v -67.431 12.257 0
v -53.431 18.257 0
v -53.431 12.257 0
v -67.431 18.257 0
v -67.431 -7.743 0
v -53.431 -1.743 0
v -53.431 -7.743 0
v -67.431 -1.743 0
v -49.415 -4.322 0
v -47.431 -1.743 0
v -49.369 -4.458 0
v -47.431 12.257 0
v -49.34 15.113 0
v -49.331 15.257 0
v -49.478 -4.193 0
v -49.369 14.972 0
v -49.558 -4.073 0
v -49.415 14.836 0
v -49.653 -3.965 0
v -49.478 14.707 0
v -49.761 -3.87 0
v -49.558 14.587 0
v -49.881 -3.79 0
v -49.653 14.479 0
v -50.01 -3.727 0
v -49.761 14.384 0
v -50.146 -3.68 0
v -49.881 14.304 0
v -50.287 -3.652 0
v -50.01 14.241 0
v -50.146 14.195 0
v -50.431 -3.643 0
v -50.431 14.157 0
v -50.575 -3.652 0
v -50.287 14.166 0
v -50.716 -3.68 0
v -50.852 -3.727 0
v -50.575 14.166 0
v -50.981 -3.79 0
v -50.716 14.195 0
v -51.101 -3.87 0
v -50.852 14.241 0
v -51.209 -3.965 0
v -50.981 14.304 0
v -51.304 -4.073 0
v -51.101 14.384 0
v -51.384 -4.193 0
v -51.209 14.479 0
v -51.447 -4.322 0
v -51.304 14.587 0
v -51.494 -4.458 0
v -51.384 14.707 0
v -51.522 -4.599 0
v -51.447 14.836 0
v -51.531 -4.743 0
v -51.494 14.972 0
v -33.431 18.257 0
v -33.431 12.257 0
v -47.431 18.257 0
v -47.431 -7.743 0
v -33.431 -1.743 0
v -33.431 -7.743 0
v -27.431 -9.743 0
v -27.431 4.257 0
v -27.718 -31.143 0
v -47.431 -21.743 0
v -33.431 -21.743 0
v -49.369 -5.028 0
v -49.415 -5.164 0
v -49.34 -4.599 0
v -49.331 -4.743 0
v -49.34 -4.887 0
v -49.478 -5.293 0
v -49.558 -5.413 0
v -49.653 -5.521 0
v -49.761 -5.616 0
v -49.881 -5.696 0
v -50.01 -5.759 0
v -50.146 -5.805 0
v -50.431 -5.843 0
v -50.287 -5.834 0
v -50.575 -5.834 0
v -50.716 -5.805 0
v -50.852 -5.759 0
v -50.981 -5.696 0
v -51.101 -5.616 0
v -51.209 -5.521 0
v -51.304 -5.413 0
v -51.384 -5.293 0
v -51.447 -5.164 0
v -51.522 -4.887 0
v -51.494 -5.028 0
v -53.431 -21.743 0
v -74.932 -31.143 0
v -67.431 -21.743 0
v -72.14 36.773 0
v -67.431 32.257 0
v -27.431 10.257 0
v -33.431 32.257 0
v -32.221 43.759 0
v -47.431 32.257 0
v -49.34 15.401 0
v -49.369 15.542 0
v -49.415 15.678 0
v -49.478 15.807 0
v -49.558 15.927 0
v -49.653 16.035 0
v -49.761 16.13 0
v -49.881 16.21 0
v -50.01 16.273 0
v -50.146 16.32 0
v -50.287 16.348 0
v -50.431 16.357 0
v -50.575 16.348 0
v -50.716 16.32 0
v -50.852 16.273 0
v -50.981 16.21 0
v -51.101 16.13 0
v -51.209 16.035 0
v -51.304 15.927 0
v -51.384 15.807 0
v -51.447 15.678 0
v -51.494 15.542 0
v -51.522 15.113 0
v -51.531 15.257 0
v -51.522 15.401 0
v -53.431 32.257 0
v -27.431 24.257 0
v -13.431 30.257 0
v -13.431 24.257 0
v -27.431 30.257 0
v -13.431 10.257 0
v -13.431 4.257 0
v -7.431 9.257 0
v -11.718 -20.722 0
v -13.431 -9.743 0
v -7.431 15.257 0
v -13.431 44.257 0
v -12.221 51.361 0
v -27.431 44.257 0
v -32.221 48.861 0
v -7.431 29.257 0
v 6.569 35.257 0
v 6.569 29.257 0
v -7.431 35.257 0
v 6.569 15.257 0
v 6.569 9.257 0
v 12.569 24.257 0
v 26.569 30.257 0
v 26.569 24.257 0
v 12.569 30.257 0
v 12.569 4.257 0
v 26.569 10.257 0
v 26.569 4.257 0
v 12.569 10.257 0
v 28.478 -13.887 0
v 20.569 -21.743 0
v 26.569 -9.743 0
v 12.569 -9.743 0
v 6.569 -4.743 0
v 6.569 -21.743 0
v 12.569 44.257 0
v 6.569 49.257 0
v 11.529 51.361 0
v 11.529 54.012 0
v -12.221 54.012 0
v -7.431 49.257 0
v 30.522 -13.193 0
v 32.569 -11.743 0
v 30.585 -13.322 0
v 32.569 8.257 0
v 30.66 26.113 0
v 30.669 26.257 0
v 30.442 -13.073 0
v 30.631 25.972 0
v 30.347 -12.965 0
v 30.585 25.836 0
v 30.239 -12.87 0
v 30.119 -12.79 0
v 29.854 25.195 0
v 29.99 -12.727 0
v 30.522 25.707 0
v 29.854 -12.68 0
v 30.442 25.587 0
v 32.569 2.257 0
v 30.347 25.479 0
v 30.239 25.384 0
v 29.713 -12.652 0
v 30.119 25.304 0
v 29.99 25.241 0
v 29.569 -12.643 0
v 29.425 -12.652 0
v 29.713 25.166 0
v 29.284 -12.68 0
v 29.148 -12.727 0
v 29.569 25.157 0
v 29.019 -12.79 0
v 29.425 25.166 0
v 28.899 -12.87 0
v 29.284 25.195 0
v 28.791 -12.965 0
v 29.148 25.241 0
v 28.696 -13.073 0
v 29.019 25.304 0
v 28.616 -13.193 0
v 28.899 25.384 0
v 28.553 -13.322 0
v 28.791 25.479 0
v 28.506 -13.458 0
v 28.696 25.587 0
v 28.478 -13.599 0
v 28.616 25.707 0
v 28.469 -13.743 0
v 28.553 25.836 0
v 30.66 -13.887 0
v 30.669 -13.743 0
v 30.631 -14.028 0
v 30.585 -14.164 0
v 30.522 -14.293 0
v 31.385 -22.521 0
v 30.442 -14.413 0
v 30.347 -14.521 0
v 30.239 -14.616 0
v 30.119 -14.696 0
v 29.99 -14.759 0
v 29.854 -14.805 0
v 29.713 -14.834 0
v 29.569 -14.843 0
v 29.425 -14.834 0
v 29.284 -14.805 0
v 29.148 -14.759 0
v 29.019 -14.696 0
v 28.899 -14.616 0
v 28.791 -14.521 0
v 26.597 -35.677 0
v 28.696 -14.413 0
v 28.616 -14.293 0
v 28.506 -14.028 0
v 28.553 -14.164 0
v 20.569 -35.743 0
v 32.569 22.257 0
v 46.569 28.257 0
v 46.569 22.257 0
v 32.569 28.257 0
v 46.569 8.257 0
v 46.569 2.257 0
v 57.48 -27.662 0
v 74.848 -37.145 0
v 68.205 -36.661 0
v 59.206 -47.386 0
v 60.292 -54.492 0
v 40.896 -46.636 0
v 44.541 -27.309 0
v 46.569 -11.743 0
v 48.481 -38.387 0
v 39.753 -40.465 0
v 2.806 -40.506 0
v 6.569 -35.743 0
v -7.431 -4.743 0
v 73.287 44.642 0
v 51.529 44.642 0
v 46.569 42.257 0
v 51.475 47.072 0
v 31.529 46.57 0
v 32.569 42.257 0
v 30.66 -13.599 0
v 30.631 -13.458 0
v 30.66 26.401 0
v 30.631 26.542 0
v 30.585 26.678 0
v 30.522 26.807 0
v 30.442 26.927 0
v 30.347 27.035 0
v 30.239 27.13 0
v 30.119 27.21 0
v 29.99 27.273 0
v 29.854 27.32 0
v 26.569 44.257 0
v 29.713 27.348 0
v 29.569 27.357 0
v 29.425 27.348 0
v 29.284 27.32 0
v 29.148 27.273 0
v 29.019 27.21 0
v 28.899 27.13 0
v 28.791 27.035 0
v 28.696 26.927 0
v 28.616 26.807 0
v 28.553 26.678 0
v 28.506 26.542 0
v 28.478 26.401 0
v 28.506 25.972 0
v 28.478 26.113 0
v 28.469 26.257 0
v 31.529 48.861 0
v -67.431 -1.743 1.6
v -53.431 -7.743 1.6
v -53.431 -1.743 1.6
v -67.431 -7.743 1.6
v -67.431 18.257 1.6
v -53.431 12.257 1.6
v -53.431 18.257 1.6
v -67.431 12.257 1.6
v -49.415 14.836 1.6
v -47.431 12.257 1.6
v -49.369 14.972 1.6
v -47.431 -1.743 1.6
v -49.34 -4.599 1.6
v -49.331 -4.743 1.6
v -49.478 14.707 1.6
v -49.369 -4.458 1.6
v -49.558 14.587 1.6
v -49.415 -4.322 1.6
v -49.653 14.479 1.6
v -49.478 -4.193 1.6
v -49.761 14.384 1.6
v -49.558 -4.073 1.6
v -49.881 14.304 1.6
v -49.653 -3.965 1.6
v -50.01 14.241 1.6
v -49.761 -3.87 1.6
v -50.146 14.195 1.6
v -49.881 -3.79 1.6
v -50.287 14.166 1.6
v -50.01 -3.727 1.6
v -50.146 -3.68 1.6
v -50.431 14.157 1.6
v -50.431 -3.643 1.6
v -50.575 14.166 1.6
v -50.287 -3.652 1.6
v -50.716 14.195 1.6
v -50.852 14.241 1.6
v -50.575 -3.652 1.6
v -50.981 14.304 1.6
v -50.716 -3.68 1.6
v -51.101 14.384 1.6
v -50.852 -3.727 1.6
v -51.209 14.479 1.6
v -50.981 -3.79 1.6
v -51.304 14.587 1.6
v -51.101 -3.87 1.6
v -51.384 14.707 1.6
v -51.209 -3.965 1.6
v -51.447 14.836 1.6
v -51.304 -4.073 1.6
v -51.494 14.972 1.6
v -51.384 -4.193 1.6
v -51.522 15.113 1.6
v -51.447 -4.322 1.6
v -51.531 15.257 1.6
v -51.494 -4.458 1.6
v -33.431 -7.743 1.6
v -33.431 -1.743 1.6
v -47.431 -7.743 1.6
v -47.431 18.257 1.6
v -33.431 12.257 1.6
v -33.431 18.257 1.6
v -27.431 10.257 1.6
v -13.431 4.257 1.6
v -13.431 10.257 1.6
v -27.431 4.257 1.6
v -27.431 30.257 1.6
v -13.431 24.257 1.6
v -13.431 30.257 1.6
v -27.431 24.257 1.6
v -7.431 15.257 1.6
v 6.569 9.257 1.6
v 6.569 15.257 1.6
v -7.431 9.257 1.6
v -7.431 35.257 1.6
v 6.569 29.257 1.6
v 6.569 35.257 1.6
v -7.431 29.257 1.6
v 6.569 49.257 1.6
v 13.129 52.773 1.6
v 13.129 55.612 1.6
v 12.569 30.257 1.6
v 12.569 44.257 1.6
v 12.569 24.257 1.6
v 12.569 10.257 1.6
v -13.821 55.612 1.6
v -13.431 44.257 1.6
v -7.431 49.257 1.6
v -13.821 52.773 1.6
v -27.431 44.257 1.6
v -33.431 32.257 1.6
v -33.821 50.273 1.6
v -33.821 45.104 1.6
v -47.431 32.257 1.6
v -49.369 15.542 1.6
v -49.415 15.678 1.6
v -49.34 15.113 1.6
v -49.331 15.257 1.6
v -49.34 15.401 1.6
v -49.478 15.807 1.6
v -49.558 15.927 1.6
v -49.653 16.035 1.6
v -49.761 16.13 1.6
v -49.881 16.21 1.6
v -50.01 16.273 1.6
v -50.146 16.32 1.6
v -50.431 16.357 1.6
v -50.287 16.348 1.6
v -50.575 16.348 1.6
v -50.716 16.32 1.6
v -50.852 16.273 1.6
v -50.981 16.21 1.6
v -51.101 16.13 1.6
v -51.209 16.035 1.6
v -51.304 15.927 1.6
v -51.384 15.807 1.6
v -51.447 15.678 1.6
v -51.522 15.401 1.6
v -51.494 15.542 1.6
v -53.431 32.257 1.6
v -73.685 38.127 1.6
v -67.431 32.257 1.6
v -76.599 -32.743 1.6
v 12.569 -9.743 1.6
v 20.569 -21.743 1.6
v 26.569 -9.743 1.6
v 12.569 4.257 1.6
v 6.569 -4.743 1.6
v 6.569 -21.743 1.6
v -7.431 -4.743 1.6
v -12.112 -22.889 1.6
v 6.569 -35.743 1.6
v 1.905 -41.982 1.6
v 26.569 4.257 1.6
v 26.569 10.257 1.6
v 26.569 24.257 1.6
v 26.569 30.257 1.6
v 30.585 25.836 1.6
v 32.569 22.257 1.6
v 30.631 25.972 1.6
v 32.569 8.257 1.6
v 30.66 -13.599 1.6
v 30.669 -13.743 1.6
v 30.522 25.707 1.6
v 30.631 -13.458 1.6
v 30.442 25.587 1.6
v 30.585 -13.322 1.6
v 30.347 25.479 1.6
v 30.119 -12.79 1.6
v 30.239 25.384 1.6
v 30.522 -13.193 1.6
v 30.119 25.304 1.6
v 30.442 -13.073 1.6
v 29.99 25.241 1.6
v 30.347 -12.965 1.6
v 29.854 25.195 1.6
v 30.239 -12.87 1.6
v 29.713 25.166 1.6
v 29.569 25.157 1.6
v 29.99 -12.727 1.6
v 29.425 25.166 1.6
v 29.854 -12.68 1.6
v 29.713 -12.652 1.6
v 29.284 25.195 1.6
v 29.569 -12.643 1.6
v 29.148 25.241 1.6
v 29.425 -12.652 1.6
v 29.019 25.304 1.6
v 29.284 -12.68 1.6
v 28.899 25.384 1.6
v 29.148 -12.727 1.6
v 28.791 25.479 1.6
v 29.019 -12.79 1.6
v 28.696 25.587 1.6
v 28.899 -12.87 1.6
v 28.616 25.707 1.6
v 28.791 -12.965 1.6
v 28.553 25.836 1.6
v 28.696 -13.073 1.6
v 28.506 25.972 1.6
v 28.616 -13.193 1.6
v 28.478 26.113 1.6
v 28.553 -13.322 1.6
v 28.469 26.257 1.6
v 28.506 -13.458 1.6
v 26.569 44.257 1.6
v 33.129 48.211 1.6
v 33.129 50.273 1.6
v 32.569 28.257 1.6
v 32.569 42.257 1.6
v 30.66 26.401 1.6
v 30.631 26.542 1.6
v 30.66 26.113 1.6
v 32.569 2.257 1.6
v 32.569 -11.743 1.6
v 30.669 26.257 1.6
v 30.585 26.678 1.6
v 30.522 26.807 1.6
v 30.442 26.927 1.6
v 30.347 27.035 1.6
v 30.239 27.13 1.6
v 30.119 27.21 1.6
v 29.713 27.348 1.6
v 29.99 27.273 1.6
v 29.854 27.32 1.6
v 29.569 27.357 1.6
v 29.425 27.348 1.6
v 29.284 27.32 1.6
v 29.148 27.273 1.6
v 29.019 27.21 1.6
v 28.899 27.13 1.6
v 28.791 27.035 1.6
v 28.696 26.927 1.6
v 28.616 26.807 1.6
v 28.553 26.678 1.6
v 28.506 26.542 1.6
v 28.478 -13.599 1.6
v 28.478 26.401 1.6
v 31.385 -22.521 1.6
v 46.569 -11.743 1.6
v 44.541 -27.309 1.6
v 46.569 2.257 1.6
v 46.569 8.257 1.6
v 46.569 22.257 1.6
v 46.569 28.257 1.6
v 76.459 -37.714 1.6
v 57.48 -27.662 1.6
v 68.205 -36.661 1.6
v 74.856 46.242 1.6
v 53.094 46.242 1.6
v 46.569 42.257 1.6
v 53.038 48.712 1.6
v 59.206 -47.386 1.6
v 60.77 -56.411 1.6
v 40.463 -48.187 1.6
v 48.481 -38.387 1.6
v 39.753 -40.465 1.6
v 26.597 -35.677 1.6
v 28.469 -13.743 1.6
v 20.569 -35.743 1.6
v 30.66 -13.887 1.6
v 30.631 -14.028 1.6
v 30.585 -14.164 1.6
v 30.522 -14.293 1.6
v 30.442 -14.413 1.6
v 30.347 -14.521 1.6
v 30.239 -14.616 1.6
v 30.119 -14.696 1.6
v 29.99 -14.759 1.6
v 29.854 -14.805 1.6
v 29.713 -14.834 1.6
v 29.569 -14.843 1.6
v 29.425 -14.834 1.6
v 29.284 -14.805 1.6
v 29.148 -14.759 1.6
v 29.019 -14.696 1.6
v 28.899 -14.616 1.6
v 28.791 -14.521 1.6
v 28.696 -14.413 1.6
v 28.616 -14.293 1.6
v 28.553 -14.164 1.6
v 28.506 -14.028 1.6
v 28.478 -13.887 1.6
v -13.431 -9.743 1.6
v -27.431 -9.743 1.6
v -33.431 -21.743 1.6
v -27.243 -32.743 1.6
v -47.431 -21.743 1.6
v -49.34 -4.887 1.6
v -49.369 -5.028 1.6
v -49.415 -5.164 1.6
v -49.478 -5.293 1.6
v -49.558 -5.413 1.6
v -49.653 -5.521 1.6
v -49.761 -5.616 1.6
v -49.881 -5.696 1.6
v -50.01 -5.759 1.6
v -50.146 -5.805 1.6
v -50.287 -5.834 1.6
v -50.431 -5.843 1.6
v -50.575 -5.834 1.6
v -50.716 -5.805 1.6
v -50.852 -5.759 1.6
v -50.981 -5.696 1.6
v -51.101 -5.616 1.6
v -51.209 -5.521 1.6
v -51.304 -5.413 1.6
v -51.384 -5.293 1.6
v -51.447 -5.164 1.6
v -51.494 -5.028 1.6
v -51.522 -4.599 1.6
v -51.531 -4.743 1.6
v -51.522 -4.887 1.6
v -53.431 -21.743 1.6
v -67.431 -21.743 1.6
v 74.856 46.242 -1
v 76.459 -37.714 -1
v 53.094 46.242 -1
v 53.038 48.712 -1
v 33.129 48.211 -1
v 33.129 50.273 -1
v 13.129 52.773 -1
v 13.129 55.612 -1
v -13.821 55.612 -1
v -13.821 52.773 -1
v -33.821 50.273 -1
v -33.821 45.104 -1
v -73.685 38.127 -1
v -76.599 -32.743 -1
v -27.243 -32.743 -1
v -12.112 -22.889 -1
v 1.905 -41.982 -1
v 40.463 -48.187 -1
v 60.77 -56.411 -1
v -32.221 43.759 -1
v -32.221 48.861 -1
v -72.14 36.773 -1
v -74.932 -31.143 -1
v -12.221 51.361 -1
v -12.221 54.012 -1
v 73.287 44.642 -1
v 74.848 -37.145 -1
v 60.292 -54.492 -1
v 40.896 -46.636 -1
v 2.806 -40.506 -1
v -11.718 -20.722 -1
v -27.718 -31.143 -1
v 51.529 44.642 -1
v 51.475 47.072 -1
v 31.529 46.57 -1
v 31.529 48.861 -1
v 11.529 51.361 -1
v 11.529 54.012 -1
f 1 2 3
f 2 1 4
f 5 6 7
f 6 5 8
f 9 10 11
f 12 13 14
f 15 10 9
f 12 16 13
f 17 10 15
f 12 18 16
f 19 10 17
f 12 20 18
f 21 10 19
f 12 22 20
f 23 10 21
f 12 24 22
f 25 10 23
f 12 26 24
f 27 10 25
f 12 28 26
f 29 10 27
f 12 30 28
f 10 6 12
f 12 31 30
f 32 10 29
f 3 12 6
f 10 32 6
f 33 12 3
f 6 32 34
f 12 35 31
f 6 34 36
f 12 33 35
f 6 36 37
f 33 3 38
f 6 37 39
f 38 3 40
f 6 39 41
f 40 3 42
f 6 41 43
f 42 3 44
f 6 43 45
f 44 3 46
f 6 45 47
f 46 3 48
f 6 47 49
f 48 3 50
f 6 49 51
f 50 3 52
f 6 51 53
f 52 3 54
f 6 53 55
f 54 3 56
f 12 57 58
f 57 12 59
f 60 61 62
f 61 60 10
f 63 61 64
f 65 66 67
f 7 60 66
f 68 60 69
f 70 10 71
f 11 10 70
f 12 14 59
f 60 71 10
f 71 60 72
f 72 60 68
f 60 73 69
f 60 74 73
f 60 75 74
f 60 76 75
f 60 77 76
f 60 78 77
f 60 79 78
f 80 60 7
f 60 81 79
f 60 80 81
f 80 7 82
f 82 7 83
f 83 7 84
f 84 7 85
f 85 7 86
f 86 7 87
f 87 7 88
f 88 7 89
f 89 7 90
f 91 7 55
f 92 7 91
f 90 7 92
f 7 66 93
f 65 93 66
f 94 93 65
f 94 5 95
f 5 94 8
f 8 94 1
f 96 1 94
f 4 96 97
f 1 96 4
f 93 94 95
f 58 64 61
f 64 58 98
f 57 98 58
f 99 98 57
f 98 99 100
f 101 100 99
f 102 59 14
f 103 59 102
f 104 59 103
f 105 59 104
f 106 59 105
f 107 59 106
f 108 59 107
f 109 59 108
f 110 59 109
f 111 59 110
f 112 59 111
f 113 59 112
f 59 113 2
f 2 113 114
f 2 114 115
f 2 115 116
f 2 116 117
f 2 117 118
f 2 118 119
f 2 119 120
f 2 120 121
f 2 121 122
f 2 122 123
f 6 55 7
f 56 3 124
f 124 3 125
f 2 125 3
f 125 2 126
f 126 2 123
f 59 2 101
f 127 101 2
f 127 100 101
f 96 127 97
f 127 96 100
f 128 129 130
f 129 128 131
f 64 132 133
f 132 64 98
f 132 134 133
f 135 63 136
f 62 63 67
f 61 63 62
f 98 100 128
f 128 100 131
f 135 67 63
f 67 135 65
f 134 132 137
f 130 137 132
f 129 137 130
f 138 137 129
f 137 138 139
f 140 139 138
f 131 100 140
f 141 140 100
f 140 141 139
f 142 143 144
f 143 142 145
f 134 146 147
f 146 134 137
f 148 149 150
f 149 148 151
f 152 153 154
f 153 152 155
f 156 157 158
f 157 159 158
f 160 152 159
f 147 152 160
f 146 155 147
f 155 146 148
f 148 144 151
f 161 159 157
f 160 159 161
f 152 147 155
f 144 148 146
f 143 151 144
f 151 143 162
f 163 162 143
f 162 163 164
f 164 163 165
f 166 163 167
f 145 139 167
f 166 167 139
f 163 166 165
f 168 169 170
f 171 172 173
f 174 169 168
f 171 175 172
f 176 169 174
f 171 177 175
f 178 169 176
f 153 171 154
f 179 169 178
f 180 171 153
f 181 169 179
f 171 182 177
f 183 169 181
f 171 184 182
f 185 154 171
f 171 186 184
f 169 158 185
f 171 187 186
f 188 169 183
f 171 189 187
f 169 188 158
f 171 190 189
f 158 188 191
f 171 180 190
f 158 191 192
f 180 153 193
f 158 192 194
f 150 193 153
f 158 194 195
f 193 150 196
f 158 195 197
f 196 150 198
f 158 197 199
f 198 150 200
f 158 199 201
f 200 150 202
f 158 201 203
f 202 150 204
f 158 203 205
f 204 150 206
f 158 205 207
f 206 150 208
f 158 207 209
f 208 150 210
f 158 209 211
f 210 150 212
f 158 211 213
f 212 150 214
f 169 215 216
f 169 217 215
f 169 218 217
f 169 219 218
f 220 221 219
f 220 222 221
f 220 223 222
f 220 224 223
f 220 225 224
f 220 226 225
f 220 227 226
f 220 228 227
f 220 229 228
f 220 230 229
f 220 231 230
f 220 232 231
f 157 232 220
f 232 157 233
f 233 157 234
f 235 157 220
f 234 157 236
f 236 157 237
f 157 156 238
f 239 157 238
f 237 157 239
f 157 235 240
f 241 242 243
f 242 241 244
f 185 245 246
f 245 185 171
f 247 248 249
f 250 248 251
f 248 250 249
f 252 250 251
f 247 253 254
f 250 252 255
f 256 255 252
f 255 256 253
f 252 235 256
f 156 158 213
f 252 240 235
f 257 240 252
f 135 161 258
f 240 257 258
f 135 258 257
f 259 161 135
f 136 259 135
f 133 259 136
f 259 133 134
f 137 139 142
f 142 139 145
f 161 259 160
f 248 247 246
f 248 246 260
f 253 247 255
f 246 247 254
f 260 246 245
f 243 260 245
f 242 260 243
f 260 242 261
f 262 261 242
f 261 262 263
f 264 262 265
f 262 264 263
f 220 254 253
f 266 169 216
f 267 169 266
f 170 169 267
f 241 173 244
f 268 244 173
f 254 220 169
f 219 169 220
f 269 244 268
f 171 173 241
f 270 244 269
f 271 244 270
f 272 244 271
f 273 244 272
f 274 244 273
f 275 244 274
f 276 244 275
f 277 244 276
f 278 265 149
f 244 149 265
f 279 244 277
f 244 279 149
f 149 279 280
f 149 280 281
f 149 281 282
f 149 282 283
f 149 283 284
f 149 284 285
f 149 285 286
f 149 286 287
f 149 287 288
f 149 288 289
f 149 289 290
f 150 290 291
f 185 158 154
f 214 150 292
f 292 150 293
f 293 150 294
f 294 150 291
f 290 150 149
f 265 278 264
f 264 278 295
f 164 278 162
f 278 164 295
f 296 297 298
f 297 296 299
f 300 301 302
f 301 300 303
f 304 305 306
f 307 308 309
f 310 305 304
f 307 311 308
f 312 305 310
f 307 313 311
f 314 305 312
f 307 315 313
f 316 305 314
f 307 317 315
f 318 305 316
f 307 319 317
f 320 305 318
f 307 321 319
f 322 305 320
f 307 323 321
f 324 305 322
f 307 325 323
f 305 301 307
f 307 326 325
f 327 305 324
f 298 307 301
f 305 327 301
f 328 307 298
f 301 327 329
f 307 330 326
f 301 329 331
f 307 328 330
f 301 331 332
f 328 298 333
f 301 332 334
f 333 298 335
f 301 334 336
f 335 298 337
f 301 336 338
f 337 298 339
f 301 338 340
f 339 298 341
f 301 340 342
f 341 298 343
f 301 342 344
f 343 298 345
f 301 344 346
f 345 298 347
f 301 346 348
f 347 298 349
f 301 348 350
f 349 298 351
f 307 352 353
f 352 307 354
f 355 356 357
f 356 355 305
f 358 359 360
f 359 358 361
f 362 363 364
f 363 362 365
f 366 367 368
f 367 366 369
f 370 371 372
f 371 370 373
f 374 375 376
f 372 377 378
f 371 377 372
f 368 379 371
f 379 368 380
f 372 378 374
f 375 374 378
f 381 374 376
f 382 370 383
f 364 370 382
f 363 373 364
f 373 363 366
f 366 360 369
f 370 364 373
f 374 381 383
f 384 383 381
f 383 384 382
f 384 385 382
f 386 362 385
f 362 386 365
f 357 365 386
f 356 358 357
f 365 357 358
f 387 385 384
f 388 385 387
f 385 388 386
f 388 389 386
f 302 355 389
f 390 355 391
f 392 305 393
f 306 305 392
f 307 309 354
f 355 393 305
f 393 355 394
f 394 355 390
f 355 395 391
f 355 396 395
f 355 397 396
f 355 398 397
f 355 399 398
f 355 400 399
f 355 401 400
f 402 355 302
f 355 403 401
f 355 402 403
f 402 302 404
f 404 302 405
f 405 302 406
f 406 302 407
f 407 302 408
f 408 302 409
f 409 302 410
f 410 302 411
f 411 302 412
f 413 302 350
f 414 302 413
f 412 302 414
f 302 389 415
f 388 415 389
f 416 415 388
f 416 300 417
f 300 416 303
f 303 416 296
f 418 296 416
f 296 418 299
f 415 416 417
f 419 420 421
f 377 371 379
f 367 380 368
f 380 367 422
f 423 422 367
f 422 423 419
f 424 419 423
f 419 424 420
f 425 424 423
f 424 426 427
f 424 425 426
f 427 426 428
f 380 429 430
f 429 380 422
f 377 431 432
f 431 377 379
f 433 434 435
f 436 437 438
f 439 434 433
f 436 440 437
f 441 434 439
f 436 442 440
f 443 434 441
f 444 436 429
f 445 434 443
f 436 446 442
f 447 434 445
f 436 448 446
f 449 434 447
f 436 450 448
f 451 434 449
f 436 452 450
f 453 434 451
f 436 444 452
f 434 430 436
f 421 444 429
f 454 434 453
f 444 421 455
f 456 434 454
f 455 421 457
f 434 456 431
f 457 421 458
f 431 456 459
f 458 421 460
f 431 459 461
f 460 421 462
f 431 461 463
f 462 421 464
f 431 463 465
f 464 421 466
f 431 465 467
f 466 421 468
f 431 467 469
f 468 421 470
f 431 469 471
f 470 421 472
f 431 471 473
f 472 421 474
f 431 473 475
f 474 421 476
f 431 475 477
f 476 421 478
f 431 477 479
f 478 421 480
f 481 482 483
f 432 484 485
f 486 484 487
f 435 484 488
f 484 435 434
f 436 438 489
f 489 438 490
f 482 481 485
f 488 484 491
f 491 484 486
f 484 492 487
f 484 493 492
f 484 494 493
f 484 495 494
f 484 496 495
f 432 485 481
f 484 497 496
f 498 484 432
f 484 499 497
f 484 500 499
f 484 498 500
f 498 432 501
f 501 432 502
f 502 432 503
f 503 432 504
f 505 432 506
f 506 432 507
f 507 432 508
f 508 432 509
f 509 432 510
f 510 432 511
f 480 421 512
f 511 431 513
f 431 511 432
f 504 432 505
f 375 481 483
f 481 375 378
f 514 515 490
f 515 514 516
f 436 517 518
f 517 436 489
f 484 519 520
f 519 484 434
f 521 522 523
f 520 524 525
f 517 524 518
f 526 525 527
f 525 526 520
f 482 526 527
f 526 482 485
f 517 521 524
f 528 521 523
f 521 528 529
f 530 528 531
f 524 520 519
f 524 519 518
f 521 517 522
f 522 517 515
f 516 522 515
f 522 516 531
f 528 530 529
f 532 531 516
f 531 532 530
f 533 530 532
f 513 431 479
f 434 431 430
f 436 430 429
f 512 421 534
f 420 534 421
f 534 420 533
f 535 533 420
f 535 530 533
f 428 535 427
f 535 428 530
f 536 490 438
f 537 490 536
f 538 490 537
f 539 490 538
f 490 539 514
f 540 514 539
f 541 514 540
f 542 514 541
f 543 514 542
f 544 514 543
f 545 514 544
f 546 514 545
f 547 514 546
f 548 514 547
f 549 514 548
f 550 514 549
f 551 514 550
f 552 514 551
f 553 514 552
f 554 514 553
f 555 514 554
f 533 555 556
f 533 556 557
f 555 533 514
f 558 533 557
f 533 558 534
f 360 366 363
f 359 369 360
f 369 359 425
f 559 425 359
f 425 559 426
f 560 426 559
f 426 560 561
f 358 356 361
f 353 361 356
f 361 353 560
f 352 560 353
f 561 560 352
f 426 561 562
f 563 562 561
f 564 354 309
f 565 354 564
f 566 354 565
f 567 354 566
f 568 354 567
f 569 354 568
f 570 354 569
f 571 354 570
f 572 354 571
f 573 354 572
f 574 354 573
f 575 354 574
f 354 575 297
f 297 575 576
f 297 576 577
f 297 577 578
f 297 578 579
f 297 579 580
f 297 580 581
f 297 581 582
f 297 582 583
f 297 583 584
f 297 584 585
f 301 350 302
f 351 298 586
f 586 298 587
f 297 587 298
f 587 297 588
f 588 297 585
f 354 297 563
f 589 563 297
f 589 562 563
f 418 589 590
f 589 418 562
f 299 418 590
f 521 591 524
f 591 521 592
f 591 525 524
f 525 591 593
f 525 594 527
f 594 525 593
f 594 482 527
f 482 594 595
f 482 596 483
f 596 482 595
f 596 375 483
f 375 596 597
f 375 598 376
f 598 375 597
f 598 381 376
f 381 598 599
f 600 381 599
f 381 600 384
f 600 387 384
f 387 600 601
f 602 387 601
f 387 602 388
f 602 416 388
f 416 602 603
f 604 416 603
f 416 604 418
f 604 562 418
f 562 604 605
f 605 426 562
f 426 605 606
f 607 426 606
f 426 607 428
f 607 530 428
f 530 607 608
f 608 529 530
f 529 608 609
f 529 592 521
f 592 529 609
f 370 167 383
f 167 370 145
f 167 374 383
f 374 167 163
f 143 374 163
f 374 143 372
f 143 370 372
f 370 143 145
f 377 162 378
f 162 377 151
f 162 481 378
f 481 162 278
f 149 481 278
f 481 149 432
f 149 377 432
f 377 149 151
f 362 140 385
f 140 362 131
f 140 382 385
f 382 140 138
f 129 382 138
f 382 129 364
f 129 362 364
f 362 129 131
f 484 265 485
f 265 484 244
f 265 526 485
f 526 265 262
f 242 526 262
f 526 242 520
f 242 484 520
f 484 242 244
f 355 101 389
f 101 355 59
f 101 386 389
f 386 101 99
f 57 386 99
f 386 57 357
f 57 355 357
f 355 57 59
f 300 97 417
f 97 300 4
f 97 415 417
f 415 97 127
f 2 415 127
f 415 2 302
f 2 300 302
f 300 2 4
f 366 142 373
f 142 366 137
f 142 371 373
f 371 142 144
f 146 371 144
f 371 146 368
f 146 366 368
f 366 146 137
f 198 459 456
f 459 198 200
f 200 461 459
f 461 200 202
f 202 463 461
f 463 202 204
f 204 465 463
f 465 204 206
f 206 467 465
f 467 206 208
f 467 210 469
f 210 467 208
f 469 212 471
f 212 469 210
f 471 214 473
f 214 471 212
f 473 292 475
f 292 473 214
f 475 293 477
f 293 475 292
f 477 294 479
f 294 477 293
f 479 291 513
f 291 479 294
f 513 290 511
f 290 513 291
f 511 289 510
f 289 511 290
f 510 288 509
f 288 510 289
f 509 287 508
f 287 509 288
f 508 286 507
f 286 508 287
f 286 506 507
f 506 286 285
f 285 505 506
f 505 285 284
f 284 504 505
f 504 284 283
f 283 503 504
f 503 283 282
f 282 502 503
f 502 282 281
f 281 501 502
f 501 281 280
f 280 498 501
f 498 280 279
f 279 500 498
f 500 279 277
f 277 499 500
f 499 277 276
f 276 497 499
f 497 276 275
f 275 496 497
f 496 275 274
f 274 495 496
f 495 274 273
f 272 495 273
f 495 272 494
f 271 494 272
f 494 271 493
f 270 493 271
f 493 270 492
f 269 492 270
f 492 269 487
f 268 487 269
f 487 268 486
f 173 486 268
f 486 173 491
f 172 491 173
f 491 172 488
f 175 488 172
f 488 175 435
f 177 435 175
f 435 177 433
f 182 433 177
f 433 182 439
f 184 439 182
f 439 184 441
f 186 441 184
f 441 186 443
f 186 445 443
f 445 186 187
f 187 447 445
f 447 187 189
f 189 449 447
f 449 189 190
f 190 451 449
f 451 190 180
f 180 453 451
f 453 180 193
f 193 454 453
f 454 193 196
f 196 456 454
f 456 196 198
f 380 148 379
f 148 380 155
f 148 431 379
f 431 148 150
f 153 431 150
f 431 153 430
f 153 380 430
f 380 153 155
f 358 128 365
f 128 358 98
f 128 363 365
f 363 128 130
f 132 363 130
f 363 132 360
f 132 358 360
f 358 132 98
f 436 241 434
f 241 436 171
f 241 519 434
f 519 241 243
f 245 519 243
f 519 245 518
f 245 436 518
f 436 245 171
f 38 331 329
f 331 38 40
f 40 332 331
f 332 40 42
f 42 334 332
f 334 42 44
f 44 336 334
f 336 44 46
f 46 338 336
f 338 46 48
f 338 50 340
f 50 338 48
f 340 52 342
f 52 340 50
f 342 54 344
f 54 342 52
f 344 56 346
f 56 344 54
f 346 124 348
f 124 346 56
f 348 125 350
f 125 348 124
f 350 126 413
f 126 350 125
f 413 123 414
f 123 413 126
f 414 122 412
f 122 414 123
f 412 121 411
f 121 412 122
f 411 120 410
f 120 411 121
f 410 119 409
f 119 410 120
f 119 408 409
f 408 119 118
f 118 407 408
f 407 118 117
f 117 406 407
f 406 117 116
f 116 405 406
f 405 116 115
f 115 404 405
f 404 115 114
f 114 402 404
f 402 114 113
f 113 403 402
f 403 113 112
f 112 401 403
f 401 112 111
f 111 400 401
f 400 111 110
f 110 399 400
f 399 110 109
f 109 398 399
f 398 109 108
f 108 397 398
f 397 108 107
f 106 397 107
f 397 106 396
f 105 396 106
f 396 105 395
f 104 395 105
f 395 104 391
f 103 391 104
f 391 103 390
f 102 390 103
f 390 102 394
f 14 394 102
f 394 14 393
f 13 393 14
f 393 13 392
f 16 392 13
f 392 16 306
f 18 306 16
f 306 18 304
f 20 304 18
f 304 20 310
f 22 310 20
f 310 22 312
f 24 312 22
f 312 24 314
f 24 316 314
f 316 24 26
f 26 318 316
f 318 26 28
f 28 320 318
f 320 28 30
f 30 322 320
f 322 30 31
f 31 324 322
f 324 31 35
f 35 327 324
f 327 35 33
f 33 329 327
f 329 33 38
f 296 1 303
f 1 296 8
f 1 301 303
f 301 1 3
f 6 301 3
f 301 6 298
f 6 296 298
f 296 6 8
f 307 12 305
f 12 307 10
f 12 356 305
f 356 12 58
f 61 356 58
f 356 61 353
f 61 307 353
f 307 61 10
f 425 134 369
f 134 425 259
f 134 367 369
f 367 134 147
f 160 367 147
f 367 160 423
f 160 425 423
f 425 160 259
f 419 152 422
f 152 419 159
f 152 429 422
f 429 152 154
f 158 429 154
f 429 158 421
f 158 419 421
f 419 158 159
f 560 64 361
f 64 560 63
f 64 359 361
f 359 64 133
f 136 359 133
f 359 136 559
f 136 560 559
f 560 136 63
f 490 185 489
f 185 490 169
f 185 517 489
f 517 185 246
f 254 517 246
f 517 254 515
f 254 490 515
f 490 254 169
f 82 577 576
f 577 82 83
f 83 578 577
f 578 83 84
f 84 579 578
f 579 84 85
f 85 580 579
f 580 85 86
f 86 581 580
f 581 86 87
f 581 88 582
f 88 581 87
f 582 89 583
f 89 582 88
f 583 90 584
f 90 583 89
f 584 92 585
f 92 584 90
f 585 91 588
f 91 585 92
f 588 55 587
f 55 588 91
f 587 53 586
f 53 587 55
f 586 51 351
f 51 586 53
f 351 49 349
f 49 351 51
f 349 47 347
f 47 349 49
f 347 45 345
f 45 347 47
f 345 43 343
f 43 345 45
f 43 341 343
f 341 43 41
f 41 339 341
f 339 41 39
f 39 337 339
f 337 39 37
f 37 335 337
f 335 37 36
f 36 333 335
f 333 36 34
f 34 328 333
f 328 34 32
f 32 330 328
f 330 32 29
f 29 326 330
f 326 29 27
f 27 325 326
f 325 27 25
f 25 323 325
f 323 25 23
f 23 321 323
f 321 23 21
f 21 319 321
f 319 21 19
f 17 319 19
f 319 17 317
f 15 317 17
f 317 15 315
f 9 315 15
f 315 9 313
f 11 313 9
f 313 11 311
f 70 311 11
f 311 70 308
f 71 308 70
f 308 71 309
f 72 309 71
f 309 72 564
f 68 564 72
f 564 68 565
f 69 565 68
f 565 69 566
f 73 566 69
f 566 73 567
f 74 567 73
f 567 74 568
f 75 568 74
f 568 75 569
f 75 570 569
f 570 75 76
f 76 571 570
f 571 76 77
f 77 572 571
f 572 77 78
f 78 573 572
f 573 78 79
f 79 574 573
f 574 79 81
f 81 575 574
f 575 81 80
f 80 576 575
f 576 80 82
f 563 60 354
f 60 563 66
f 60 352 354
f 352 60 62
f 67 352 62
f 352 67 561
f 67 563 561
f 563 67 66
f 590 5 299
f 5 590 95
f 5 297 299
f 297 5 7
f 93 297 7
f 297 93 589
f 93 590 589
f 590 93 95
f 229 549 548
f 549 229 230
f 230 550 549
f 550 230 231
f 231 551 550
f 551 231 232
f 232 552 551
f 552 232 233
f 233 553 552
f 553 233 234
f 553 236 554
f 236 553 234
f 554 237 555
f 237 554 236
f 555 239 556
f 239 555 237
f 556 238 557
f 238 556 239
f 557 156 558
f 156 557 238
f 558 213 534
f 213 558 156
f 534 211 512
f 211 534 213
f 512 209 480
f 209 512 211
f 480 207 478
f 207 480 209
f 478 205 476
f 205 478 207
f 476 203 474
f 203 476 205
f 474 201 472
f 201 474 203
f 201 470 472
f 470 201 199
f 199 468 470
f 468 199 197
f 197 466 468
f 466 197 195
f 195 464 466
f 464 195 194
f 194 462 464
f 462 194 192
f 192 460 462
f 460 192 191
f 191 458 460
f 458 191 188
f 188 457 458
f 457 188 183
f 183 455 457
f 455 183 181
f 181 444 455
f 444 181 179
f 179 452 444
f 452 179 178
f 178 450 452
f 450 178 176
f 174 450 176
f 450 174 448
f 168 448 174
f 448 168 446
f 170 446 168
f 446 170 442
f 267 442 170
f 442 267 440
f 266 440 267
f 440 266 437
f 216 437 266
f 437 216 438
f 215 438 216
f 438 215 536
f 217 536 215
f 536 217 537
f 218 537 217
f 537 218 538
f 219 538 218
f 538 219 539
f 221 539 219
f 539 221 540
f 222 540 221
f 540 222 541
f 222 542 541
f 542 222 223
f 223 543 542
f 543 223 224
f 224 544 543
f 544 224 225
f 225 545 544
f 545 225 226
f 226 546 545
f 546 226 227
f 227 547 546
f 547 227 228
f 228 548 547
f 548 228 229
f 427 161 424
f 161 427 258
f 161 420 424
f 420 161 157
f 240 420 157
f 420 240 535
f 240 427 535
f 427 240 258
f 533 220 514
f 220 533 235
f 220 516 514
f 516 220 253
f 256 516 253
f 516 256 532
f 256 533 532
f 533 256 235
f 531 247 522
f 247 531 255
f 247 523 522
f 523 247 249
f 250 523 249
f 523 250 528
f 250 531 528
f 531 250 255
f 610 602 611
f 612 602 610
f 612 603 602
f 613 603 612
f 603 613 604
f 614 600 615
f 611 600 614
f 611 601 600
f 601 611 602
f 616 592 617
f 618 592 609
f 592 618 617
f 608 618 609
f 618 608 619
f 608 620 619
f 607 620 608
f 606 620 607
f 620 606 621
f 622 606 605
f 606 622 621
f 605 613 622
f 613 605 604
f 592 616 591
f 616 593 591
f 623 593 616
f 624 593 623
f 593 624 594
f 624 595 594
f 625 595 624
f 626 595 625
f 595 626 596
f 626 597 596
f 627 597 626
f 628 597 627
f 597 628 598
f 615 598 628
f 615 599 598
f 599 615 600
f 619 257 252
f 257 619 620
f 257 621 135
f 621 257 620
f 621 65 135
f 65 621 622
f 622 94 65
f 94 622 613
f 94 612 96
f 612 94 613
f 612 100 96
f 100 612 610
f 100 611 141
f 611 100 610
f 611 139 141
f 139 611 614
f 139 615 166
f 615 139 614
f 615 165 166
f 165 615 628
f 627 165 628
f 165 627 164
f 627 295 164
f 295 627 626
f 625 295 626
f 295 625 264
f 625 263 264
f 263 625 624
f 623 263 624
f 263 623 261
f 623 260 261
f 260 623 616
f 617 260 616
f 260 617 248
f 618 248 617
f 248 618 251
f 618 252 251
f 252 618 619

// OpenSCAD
// file: plate-geometry.scad
module perimeter() { offset(delta=outline_expansion) polygon(outline); }
module bolt_holes(d=bolt_diameter) { for (p=bolts) translate(p) circle(d=d); }
module key_holes(size=switch_cutout) {
    for (key=keys) translate([key[0],key[1]]) rotate(key[2]) square(size,center=true);
}
module plate() { difference() { perimeter(); bolt_holes(); key_holes(); } }

module reinforced_plate(rim_width=1.6, rim_height=1) {
    linear_extrude(plate_thickness) plate();
    translate([0,0,-rim_height]) linear_extrude(rim_height)
        difference() {
            perimeter();
            offset(delta=outline_expansion-rim_width) polygon(outline);
            key_holes(20);
            bolt_holes(washer_diameter+1.5);
        }
}
// file: geometry.scad
left_geometry = [[[-72.4310476, -28.742944300000005], [-69.8210476, 34.742055699999995], [-29.821047599999986, 41.74305569999999], [-29.821047599999986, 46.742055699999995], [-9.821047599999986, 49.242055699999995], [-9.821047599999986, 51.6120557], [9.128952400000003, 51.6120557], [9.128952400000003, 49.242055699999995], [29.128952400000003, 46.742055699999995], [29.128952400000003, 44.1090557], [49.1289524, 44.6120557], [49.1819524, 42.242055699999995], [70.9319524, 42.242055699999995], [72.4310476, -36.29116690000001], [59.57529539999999, -51.61205570000001], [41.5456772, -44.3100719], [4.158952400000004, -38.2929443], [-11.126047599999993, -17.47294430000001], [-28.4310476, -28.742944300000005]], [[-60.4310476, -14.742944300000005, 0.0], [-60.4310476, 5.257055699999995, 0.0], [-60.4310476, 25.257055699999995, 0.0], [-40.4310476, -14.742944300000005, 0.0], [-40.4310476, 5.257055699999995, 0.0], [-40.4310476, 25.257055699999995, 0.0], [-20.4310476, -2.742944300000005, 0.0], [-20.4310476, 17.257055699999995, 0.0], [-20.4310476, 37.257055699999995, 0.0], [-0.4310475999999994, 2.257055699999995, 0.0], [-0.4310475999999994, 22.257055699999995, 0.0], [-0.4310475999999994, 42.257055699999995, 0.0], [19.5689524, -2.742944300000005, 0.0], [19.5689524, 17.257055699999995, 0.0], [19.5689524, 37.257055699999995, 0.0], [39.5689524, -4.742944300000005, 0.0], [39.5689524, 15.257055699999995, 0.0], [39.5689524, 35.257055699999995, 0.0], [13.5689524, -28.742944300000005, 0.0], [35.5689524, -31.492944300000005, -20.0], [58.34272709999999, -37.523735200000004, 50.0]], [[-50.4310476, 15.257055699999995], [-50.4310476, -4.742944300000005], [29.5689524, 26.257055699999995], [29.5689524, -13.742944300000005]], [59.27295240000001, 24.387055699999998], [59.27295240000001, 39.9570557], [68.8189524, -3.742944300000005], [-72.4310476, -51.61205570000001, 72.4310476, 51.6120557], [-8.4310476, 17.757055699999995], 2.2];
right_geometry = [[[72.4310476, -28.742944300000005], [69.82104759999999, 34.742055699999995], [29.821047599999986, 41.74305569999999], [29.821047599999986, 46.742055699999995], [9.821047599999986, 49.242055699999995], [9.821047599999986, 51.6120557], [-9.128952400000003, 51.6120557], [-9.128952400000003, 49.242055699999995], [-29.128952400000003, 46.742055699999995], [-29.128952400000003, 44.1090557], [-49.1289524, 44.6120557], [-49.1819524, 42.242055699999995], [-70.9319524, 42.242055699999995], [-72.4310476, -36.29116690000001], [-59.57529539999999, -51.61205570000001], [-41.5456772, -44.3100719], [-4.158952400000004, -38.2929443], [11.126047599999993, -17.47294430000001], [28.4310476, -28.742944300000005]], [[60.4310476, -14.742944300000005, 0.0], [60.4310476, 5.257055699999995, 0.0], [60.4310476, 25.257055699999995, 0.0], [40.4310476, -14.742944300000005, 0.0], [40.4310476, 5.257055699999995, 0.0], [40.4310476, 25.257055699999995, 0.0], [20.4310476, -2.742944300000005, 0.0], [20.4310476, 17.257055699999995, 0.0], [20.4310476, 37.257055699999995, 0.0], [0.4310475999999994, 2.257055699999995, 0.0], [0.4310475999999994, 22.257055699999995, 0.0], [0.4310475999999994, 42.257055699999995, 0.0], [-19.5689524, -2.742944300000005, 0.0], [-19.5689524, 17.257055699999995, 0.0], [-19.5689524, 37.257055699999995, 0.0], [-39.5689524, -4.742944300000005, 0.0], [-39.5689524, 15.257055699999995, 0.0], [-39.5689524, 35.257055699999995, 0.0], [-13.5689524, -28.742944300000005, 0.0], [-35.5689524, -31.492944300000005, 20.0], [-58.34272709999999, -37.523735200000004, -50.0]], [[50.4310476, 15.257055699999995], [50.4310476, -4.742944300000005], [-29.5689524, 26.257055699999995], [-29.5689524, -13.742944300000005]], [-59.27295240000001, 24.387055699999998], [-59.27295240000001, 39.9570557], [-68.8189524, -3.742944300000005], [-72.4310476, -51.61205570000001, 72.4310476, 51.6120557], [8.4310476, 17.757055699999995], 2.2];
// file: parameters.scad
bottom_thickness = 3.175;
plate_thickness = 1.6002;
standoff_height = 15;
standoff_shim = 1;
pcb_thickness = 1.6;
plate_to_pcb_gap = 3.5;
outline_expansion = 4;
bolt_diameter = 2.2;
switch_cutout = 14;
damping_thickness = 1.6002;
damping_bolt_diameter = 5.2;
standoff_diameter = 4.7;
standoff_across_flats = 4;
upper_spacer_height = 3;
upper_spacer_shim = 0.5;
upper_spacer_diameter = 4;
washer_diameter = 5.5;
top_screw_length = 12;
bottom_screw_length = 6;
screw_head_washer = 0.5;
standoff_thread_depth = 5;
controller_gap = 8;
controller_board_thickness = 1.6;
controller_component_height = 3;
controller_width = 18;
controller_length = 34;
// main file
side = "left";
$fn = 48;
include <parameters.scad>
include <geometry.scad>
include <plate-geometry.scad>

data = side == "left" ? left_geometry : right_geometry;
outline = data[0];
keys = data[1];
bolts = data[2];
reinforced_plate();
